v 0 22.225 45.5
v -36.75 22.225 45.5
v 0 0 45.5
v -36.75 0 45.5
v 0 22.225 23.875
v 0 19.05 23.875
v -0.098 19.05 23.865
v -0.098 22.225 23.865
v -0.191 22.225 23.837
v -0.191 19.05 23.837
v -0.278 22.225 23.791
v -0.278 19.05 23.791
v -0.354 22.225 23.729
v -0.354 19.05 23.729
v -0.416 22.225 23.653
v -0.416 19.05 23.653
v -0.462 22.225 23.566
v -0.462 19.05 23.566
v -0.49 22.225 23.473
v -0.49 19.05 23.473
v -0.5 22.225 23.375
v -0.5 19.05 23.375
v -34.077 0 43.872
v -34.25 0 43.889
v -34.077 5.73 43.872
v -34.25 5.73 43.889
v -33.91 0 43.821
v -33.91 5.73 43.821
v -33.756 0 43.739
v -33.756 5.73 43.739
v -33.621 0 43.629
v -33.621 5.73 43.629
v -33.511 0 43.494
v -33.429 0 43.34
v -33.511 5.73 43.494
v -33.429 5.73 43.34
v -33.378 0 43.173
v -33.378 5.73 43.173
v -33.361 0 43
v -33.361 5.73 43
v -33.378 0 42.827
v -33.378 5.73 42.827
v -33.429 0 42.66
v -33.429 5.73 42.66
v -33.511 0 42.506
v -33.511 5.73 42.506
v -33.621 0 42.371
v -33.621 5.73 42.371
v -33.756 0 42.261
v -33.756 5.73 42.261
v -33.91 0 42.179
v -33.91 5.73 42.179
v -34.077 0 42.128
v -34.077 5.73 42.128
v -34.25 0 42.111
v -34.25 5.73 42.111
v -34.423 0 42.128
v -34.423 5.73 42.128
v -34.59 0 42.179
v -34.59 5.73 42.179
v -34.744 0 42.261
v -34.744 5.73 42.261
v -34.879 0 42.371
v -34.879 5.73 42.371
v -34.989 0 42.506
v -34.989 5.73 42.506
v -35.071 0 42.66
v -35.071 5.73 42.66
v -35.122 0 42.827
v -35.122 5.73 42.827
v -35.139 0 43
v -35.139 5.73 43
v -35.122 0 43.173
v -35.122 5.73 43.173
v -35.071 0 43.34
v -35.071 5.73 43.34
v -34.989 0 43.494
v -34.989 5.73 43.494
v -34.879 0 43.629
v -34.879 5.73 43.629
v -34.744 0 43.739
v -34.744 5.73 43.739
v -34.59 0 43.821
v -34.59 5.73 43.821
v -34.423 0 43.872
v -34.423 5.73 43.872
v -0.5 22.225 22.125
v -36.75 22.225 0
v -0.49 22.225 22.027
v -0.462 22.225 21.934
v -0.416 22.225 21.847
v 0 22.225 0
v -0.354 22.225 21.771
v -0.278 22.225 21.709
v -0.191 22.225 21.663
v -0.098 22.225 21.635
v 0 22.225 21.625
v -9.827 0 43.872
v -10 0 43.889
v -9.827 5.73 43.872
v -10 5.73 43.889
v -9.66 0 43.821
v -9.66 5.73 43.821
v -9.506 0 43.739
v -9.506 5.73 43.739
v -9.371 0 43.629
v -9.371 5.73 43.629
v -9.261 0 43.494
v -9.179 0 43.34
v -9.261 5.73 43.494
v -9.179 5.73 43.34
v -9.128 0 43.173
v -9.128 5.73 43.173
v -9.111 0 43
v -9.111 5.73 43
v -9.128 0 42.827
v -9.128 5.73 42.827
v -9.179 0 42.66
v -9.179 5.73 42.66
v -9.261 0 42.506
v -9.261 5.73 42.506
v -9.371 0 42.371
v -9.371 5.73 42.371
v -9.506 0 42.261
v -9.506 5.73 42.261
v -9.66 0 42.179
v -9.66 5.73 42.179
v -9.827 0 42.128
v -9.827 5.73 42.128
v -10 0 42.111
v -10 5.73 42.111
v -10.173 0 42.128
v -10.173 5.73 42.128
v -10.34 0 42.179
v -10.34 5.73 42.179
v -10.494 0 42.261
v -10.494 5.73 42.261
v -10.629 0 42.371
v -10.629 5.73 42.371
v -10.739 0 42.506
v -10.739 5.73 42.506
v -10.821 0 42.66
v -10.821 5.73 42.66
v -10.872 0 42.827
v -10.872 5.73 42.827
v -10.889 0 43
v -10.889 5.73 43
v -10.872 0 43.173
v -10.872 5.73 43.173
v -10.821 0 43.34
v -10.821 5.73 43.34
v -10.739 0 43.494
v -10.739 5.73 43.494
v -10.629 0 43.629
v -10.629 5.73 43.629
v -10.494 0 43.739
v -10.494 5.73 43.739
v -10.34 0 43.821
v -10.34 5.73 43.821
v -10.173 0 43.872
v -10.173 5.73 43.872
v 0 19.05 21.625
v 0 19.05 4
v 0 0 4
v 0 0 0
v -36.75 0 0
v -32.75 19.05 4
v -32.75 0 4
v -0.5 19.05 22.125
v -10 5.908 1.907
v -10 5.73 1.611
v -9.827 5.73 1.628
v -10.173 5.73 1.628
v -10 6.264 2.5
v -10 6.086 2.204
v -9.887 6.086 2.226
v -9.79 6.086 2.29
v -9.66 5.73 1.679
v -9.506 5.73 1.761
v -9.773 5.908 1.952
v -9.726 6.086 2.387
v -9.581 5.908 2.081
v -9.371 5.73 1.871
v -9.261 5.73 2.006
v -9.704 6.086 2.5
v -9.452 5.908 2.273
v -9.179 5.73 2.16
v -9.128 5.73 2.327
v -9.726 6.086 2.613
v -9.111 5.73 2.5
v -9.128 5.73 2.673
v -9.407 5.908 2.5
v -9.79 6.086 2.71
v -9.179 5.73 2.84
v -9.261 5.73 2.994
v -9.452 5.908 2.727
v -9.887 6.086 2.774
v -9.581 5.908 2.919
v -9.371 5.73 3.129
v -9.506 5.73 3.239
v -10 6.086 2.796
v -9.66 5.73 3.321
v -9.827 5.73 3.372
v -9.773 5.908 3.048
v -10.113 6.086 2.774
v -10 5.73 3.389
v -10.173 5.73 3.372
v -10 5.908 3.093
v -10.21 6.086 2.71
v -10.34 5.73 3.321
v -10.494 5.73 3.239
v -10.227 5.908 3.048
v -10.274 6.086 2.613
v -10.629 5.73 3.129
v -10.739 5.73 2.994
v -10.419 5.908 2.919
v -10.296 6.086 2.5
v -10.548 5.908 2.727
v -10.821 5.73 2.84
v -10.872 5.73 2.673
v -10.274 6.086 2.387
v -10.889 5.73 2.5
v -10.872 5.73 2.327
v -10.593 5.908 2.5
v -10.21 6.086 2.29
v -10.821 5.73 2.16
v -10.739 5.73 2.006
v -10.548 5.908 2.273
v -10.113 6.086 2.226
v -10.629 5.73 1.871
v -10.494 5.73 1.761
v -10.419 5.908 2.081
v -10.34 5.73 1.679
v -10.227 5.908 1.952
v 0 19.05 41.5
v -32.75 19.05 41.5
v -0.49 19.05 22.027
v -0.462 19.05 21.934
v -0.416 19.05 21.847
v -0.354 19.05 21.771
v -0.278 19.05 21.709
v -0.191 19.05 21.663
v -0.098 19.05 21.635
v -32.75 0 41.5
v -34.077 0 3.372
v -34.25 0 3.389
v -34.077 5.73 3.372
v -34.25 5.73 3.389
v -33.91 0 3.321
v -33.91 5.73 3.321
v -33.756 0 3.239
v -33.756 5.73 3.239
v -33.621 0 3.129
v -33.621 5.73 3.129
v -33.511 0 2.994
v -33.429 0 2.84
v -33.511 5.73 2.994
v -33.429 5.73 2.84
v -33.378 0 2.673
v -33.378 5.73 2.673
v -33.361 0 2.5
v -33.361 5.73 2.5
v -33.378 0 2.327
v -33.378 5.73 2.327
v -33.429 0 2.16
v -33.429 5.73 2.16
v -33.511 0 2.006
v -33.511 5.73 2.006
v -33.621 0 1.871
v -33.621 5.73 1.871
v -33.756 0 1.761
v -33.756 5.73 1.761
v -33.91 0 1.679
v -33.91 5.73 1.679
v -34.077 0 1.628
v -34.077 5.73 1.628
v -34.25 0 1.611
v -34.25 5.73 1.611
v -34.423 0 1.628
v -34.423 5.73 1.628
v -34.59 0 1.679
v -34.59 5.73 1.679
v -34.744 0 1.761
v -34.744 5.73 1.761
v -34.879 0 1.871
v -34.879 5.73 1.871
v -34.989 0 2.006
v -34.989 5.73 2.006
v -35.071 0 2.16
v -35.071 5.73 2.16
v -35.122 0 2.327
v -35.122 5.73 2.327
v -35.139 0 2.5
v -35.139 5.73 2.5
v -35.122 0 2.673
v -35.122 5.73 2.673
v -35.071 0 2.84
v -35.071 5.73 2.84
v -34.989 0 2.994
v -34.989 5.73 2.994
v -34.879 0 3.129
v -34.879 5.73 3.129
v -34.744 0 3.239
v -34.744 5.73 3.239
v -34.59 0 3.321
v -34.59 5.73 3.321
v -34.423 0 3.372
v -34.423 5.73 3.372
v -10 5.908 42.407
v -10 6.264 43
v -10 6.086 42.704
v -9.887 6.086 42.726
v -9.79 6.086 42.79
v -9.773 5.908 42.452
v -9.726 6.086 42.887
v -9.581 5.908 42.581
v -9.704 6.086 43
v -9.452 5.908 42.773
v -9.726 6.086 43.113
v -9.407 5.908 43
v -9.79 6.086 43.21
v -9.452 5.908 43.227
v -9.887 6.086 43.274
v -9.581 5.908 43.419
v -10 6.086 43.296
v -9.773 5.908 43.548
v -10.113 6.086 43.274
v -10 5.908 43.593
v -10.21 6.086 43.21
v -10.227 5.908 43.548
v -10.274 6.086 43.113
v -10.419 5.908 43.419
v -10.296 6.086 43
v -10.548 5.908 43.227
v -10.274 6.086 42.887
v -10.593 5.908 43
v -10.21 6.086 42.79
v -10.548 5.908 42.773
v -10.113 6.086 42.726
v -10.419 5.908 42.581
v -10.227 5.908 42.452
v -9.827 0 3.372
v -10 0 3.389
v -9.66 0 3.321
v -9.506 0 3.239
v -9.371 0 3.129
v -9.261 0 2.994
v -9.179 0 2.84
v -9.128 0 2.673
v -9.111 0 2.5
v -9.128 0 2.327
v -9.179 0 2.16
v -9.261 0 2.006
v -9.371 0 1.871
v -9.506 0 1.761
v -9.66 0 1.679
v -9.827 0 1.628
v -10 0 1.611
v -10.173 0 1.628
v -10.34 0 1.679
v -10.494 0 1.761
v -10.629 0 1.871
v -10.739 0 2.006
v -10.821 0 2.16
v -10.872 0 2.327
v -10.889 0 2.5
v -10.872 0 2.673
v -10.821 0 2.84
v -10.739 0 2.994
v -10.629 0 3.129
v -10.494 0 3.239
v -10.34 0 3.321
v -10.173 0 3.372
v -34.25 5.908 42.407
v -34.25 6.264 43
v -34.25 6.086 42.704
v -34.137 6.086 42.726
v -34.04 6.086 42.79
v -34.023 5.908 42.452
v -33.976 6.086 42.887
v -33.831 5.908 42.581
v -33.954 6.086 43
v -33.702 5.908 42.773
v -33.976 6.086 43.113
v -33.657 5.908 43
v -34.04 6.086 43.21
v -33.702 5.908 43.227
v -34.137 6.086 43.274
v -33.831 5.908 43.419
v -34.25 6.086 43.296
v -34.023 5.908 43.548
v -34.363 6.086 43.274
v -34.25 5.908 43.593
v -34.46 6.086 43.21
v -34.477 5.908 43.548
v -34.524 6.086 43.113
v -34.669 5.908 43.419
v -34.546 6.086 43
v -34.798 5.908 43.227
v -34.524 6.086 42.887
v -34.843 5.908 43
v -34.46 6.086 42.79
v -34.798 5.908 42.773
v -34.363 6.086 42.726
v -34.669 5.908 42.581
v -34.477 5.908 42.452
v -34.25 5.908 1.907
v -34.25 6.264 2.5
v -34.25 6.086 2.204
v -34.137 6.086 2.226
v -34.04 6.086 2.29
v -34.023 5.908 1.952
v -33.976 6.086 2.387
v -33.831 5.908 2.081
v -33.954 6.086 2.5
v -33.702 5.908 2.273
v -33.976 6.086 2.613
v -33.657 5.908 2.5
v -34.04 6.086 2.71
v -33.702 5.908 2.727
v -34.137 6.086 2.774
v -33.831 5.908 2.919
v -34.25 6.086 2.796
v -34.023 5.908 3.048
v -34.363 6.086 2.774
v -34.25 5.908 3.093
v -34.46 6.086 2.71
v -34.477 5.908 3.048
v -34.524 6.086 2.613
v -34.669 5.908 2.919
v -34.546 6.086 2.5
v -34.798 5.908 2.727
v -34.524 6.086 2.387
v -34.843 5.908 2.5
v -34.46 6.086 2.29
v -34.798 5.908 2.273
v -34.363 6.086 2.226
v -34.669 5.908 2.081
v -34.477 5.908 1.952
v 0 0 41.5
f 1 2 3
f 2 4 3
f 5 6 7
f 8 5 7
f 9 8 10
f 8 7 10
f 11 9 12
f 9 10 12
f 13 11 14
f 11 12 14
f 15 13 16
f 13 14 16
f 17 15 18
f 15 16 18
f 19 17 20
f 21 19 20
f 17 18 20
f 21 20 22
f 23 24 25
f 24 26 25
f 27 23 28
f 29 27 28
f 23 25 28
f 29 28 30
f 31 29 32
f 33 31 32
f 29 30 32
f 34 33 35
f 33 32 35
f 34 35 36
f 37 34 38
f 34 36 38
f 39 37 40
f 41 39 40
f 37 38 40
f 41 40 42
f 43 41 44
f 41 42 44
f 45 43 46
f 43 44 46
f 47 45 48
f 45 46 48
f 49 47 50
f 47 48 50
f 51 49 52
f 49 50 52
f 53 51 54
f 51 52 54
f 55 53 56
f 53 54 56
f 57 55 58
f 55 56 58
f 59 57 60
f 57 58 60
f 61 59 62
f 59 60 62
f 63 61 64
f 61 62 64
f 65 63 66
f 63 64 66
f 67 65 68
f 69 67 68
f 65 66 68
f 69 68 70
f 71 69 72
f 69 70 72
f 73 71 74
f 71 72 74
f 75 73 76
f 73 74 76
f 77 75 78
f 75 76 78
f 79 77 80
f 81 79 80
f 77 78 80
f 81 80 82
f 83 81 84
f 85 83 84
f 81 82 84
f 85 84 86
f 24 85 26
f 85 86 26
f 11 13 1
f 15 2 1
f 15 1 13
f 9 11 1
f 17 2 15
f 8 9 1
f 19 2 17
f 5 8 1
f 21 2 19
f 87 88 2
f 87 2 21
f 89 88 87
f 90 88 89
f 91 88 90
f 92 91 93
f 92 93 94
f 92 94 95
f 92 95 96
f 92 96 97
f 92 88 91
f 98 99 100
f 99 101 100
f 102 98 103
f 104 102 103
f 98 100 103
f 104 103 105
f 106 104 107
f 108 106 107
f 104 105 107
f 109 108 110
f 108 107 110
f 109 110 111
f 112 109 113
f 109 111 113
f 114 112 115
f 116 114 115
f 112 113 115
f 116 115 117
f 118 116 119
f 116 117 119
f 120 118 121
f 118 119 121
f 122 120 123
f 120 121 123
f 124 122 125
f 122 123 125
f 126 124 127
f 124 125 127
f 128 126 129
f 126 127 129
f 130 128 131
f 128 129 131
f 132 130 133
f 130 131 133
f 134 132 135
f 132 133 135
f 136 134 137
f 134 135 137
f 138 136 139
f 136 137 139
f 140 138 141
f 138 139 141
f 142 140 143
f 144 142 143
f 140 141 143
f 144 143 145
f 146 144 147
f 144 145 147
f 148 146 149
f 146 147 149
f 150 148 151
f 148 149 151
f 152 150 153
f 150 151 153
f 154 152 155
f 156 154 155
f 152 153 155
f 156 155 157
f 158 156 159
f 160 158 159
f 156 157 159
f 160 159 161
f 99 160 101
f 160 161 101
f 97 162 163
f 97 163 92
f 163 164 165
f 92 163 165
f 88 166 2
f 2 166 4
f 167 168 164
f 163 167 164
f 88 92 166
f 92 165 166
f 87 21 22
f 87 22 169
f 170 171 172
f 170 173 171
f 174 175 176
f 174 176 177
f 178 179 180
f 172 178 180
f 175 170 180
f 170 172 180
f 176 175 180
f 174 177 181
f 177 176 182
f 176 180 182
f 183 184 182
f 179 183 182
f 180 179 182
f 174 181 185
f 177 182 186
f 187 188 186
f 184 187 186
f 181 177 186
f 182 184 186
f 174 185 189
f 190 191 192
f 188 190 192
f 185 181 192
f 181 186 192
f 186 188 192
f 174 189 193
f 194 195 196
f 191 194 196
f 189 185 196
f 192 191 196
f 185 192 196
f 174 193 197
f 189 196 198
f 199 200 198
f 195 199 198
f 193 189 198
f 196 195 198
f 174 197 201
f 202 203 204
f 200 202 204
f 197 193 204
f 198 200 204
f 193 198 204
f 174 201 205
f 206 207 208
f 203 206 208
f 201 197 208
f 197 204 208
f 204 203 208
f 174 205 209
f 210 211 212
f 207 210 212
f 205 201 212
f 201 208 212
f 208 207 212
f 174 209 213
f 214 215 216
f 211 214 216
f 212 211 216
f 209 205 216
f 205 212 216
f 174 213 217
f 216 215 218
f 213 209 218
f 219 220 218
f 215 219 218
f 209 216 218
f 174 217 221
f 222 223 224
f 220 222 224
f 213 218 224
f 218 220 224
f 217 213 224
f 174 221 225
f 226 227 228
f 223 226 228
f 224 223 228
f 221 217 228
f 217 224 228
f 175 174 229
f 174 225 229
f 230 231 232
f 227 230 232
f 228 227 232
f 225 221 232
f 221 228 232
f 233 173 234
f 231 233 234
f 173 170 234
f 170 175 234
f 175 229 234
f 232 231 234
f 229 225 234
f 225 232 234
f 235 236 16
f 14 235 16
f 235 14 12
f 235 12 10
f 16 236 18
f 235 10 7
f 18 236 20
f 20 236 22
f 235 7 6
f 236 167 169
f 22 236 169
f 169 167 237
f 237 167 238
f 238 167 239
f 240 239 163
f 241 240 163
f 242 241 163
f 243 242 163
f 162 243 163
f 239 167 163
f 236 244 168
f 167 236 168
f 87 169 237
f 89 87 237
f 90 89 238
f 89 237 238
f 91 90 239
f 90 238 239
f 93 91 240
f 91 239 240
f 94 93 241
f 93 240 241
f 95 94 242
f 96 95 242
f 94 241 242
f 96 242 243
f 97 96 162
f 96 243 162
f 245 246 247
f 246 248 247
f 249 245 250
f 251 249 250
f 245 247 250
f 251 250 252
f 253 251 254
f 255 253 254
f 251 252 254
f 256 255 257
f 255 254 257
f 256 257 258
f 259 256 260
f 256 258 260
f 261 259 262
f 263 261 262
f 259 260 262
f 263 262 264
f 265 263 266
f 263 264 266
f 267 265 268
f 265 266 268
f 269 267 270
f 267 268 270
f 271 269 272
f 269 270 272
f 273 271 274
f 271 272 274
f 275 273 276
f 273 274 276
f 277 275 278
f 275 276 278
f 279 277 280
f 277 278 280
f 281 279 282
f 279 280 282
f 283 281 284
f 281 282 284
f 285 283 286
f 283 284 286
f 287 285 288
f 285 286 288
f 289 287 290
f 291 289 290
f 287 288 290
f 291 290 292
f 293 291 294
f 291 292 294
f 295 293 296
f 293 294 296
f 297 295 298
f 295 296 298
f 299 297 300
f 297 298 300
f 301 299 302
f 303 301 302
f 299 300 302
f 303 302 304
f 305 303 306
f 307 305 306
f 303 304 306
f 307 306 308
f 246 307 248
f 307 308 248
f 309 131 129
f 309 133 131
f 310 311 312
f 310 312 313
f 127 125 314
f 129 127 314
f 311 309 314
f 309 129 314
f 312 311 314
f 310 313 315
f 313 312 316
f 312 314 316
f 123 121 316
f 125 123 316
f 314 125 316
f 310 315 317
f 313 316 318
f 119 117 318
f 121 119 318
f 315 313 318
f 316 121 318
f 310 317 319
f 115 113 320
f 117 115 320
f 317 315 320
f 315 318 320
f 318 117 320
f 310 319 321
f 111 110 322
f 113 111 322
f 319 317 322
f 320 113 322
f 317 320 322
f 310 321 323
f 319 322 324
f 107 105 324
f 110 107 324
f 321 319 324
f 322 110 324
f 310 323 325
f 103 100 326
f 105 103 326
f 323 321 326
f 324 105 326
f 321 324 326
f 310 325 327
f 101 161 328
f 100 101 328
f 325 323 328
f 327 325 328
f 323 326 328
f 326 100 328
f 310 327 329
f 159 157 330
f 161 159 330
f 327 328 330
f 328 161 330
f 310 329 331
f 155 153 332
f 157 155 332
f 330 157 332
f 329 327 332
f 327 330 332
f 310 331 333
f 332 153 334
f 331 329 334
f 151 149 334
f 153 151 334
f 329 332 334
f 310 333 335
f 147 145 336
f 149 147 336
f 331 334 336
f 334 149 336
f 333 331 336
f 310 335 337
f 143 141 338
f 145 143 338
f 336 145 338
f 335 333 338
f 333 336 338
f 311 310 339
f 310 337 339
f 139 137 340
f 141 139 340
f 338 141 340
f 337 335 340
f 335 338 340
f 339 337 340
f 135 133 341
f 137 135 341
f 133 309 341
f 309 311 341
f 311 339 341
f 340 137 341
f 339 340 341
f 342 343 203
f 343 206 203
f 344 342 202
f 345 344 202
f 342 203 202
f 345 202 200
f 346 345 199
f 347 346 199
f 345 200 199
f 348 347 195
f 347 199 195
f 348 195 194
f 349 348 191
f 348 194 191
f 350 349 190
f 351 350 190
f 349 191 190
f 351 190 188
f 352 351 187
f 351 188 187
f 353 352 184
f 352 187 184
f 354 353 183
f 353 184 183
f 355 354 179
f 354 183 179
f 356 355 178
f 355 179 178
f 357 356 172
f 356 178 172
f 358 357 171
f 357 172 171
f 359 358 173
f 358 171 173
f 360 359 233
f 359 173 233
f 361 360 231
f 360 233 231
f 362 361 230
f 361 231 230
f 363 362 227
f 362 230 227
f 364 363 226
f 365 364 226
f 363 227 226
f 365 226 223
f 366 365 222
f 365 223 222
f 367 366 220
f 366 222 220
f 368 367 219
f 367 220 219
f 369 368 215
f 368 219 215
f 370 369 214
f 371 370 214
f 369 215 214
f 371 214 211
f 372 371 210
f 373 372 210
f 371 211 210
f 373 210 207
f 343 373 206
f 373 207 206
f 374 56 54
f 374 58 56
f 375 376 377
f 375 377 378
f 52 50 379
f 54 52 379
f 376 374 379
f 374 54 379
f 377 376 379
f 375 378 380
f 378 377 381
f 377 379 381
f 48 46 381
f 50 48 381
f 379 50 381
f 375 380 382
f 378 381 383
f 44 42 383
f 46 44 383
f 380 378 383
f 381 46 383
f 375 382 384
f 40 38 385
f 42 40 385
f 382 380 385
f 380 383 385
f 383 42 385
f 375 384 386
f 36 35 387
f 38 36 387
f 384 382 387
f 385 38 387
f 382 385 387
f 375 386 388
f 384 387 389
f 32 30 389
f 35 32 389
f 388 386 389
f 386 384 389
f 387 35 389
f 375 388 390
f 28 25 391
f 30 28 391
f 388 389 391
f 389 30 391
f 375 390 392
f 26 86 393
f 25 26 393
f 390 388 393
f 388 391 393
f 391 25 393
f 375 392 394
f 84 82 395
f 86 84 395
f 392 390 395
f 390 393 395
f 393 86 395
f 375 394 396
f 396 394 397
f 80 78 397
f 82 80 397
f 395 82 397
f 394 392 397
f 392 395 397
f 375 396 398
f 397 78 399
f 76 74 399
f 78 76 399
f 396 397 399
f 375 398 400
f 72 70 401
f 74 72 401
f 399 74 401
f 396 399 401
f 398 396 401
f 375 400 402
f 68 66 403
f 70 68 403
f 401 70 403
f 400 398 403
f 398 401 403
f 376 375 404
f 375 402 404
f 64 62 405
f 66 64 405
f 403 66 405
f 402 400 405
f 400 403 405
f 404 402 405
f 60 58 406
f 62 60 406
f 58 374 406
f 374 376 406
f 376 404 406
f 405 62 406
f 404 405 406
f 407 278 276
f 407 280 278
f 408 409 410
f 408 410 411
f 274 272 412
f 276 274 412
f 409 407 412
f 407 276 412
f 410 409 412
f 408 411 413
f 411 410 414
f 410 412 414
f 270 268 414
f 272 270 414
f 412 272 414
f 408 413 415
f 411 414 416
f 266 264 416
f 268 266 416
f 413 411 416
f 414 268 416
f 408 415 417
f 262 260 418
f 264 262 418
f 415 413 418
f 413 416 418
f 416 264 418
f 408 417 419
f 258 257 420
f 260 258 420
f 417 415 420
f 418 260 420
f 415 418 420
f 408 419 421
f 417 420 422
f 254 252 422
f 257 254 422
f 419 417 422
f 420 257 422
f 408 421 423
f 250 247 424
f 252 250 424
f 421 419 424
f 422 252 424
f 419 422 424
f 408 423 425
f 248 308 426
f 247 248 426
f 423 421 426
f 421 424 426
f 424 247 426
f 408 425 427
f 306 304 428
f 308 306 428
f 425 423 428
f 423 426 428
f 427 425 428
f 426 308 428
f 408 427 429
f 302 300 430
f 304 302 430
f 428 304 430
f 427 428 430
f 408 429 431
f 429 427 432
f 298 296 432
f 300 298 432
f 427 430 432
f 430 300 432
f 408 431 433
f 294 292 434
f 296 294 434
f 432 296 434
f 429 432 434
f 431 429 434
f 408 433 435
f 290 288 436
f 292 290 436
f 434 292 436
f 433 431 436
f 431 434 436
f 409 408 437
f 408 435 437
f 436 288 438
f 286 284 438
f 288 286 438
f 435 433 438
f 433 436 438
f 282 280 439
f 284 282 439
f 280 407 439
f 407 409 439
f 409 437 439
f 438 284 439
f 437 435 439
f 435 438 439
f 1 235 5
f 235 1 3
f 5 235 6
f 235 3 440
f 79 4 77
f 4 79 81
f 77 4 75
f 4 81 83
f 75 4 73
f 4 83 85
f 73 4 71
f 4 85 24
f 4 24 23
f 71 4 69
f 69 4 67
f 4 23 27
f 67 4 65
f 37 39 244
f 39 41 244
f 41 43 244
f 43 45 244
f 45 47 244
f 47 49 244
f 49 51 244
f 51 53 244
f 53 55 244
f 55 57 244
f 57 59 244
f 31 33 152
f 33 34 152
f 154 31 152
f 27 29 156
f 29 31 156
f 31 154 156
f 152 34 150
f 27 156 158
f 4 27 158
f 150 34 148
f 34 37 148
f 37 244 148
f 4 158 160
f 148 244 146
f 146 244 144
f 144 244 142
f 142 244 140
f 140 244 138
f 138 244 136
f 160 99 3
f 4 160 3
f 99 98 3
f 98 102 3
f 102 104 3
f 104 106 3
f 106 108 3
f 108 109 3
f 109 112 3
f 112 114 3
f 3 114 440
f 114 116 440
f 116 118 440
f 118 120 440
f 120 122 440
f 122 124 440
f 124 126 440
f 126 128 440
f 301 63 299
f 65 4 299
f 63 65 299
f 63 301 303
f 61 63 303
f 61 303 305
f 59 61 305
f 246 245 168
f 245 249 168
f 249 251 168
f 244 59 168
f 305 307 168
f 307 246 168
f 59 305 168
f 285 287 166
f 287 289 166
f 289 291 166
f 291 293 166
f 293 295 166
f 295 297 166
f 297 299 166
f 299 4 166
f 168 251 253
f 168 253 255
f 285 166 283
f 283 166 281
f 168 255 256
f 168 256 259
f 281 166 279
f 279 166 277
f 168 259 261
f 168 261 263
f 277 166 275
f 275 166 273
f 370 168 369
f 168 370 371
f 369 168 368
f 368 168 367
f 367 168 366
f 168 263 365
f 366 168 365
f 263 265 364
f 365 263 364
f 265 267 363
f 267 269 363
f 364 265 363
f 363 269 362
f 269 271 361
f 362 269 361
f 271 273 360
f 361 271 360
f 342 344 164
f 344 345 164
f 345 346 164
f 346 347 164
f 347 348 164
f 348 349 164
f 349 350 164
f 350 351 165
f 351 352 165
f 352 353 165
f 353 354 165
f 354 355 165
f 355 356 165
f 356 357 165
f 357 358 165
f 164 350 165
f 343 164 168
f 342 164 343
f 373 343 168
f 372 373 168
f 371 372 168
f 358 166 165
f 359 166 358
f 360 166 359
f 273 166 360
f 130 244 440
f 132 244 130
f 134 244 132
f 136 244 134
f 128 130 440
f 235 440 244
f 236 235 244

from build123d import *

# Parameters (mm, degrees)
WALL_DEPTH                = 19.05
ROOF_START                = 19.05
ROOF_DEPTH                = 3.175
F_2_56_TAPPED_HOLE1_D     = 1.778
F_2_56_TAPPED_HOLE1_DEPTH = 5.73
F_2_56_TAPPED_HOLE1_TIP   = 0.53416509


with BuildPart() as part:
    # MainSketch → Wall (new body)
    with BuildSketch(Plane(origin=(0, 0, 0), x_dir=(1, 0, 0), z_dir=(0, 1, 0))):
        Polygon((-32.75, -4), (0, -4), (0, 0), (-36.75, 0), (-36.75, -45.5), (0, -45.5), (0, -41.5), (-32.75, -41.5), align=None)
    extrude(amount=WALL_DEPTH)

    # MainSketch<3> → Roof (add)
    with BuildSketch(Plane(origin=(0, 0, 0), x_dir=(1, 0, 0), z_dir=(0, 1, 0)).offset(ROOF_START)):
        with BuildLine():
            Line((0, -21.625), (0, 0))
            Line((0, 0), (-36.75, 0))
            Line((-36.75, 0), (-36.75, -45.5))
            Line((-36.75, -45.5), (0, -45.5))
            Line((0, -45.5), (0, -23.875))
            ThreePointArc((0, -23.875), (-0.353553391, -23.728553391), (-0.5, -23.375))
            Line((-0.5, -23.375), (-0.5, -22.125))
            ThreePointArc((-0.5, -22.125), (-0.353553391, -21.771446609), (0, -21.625))
        make_face()
    extrude(amount=ROOF_DEPTH)

    # #2-56 Tapped Hole1
    with Locations(Plane(origin=(-10, 0, 43), x_dir=(0, 0, -1), z_dir=(0, -1, 0))):
        with Locations((0, 0), (0, -24.25), (40.5, -24.25), (40.5, 0)):
            Hole(F_2_56_TAPPED_HOLE1_D / 2, depth=F_2_56_TAPPED_HOLE1_DEPTH)
            with Locations((0, 0, -(F_2_56_TAPPED_HOLE1_DEPTH + F_2_56_TAPPED_HOLE1_TIP / 2))):  # 118° drill point
                Cone(0, F_2_56_TAPPED_HOLE1_D / 2, F_2_56_TAPPED_HOLE1_TIP, mode=Mode.SUBTRACT)


solid = part.part
